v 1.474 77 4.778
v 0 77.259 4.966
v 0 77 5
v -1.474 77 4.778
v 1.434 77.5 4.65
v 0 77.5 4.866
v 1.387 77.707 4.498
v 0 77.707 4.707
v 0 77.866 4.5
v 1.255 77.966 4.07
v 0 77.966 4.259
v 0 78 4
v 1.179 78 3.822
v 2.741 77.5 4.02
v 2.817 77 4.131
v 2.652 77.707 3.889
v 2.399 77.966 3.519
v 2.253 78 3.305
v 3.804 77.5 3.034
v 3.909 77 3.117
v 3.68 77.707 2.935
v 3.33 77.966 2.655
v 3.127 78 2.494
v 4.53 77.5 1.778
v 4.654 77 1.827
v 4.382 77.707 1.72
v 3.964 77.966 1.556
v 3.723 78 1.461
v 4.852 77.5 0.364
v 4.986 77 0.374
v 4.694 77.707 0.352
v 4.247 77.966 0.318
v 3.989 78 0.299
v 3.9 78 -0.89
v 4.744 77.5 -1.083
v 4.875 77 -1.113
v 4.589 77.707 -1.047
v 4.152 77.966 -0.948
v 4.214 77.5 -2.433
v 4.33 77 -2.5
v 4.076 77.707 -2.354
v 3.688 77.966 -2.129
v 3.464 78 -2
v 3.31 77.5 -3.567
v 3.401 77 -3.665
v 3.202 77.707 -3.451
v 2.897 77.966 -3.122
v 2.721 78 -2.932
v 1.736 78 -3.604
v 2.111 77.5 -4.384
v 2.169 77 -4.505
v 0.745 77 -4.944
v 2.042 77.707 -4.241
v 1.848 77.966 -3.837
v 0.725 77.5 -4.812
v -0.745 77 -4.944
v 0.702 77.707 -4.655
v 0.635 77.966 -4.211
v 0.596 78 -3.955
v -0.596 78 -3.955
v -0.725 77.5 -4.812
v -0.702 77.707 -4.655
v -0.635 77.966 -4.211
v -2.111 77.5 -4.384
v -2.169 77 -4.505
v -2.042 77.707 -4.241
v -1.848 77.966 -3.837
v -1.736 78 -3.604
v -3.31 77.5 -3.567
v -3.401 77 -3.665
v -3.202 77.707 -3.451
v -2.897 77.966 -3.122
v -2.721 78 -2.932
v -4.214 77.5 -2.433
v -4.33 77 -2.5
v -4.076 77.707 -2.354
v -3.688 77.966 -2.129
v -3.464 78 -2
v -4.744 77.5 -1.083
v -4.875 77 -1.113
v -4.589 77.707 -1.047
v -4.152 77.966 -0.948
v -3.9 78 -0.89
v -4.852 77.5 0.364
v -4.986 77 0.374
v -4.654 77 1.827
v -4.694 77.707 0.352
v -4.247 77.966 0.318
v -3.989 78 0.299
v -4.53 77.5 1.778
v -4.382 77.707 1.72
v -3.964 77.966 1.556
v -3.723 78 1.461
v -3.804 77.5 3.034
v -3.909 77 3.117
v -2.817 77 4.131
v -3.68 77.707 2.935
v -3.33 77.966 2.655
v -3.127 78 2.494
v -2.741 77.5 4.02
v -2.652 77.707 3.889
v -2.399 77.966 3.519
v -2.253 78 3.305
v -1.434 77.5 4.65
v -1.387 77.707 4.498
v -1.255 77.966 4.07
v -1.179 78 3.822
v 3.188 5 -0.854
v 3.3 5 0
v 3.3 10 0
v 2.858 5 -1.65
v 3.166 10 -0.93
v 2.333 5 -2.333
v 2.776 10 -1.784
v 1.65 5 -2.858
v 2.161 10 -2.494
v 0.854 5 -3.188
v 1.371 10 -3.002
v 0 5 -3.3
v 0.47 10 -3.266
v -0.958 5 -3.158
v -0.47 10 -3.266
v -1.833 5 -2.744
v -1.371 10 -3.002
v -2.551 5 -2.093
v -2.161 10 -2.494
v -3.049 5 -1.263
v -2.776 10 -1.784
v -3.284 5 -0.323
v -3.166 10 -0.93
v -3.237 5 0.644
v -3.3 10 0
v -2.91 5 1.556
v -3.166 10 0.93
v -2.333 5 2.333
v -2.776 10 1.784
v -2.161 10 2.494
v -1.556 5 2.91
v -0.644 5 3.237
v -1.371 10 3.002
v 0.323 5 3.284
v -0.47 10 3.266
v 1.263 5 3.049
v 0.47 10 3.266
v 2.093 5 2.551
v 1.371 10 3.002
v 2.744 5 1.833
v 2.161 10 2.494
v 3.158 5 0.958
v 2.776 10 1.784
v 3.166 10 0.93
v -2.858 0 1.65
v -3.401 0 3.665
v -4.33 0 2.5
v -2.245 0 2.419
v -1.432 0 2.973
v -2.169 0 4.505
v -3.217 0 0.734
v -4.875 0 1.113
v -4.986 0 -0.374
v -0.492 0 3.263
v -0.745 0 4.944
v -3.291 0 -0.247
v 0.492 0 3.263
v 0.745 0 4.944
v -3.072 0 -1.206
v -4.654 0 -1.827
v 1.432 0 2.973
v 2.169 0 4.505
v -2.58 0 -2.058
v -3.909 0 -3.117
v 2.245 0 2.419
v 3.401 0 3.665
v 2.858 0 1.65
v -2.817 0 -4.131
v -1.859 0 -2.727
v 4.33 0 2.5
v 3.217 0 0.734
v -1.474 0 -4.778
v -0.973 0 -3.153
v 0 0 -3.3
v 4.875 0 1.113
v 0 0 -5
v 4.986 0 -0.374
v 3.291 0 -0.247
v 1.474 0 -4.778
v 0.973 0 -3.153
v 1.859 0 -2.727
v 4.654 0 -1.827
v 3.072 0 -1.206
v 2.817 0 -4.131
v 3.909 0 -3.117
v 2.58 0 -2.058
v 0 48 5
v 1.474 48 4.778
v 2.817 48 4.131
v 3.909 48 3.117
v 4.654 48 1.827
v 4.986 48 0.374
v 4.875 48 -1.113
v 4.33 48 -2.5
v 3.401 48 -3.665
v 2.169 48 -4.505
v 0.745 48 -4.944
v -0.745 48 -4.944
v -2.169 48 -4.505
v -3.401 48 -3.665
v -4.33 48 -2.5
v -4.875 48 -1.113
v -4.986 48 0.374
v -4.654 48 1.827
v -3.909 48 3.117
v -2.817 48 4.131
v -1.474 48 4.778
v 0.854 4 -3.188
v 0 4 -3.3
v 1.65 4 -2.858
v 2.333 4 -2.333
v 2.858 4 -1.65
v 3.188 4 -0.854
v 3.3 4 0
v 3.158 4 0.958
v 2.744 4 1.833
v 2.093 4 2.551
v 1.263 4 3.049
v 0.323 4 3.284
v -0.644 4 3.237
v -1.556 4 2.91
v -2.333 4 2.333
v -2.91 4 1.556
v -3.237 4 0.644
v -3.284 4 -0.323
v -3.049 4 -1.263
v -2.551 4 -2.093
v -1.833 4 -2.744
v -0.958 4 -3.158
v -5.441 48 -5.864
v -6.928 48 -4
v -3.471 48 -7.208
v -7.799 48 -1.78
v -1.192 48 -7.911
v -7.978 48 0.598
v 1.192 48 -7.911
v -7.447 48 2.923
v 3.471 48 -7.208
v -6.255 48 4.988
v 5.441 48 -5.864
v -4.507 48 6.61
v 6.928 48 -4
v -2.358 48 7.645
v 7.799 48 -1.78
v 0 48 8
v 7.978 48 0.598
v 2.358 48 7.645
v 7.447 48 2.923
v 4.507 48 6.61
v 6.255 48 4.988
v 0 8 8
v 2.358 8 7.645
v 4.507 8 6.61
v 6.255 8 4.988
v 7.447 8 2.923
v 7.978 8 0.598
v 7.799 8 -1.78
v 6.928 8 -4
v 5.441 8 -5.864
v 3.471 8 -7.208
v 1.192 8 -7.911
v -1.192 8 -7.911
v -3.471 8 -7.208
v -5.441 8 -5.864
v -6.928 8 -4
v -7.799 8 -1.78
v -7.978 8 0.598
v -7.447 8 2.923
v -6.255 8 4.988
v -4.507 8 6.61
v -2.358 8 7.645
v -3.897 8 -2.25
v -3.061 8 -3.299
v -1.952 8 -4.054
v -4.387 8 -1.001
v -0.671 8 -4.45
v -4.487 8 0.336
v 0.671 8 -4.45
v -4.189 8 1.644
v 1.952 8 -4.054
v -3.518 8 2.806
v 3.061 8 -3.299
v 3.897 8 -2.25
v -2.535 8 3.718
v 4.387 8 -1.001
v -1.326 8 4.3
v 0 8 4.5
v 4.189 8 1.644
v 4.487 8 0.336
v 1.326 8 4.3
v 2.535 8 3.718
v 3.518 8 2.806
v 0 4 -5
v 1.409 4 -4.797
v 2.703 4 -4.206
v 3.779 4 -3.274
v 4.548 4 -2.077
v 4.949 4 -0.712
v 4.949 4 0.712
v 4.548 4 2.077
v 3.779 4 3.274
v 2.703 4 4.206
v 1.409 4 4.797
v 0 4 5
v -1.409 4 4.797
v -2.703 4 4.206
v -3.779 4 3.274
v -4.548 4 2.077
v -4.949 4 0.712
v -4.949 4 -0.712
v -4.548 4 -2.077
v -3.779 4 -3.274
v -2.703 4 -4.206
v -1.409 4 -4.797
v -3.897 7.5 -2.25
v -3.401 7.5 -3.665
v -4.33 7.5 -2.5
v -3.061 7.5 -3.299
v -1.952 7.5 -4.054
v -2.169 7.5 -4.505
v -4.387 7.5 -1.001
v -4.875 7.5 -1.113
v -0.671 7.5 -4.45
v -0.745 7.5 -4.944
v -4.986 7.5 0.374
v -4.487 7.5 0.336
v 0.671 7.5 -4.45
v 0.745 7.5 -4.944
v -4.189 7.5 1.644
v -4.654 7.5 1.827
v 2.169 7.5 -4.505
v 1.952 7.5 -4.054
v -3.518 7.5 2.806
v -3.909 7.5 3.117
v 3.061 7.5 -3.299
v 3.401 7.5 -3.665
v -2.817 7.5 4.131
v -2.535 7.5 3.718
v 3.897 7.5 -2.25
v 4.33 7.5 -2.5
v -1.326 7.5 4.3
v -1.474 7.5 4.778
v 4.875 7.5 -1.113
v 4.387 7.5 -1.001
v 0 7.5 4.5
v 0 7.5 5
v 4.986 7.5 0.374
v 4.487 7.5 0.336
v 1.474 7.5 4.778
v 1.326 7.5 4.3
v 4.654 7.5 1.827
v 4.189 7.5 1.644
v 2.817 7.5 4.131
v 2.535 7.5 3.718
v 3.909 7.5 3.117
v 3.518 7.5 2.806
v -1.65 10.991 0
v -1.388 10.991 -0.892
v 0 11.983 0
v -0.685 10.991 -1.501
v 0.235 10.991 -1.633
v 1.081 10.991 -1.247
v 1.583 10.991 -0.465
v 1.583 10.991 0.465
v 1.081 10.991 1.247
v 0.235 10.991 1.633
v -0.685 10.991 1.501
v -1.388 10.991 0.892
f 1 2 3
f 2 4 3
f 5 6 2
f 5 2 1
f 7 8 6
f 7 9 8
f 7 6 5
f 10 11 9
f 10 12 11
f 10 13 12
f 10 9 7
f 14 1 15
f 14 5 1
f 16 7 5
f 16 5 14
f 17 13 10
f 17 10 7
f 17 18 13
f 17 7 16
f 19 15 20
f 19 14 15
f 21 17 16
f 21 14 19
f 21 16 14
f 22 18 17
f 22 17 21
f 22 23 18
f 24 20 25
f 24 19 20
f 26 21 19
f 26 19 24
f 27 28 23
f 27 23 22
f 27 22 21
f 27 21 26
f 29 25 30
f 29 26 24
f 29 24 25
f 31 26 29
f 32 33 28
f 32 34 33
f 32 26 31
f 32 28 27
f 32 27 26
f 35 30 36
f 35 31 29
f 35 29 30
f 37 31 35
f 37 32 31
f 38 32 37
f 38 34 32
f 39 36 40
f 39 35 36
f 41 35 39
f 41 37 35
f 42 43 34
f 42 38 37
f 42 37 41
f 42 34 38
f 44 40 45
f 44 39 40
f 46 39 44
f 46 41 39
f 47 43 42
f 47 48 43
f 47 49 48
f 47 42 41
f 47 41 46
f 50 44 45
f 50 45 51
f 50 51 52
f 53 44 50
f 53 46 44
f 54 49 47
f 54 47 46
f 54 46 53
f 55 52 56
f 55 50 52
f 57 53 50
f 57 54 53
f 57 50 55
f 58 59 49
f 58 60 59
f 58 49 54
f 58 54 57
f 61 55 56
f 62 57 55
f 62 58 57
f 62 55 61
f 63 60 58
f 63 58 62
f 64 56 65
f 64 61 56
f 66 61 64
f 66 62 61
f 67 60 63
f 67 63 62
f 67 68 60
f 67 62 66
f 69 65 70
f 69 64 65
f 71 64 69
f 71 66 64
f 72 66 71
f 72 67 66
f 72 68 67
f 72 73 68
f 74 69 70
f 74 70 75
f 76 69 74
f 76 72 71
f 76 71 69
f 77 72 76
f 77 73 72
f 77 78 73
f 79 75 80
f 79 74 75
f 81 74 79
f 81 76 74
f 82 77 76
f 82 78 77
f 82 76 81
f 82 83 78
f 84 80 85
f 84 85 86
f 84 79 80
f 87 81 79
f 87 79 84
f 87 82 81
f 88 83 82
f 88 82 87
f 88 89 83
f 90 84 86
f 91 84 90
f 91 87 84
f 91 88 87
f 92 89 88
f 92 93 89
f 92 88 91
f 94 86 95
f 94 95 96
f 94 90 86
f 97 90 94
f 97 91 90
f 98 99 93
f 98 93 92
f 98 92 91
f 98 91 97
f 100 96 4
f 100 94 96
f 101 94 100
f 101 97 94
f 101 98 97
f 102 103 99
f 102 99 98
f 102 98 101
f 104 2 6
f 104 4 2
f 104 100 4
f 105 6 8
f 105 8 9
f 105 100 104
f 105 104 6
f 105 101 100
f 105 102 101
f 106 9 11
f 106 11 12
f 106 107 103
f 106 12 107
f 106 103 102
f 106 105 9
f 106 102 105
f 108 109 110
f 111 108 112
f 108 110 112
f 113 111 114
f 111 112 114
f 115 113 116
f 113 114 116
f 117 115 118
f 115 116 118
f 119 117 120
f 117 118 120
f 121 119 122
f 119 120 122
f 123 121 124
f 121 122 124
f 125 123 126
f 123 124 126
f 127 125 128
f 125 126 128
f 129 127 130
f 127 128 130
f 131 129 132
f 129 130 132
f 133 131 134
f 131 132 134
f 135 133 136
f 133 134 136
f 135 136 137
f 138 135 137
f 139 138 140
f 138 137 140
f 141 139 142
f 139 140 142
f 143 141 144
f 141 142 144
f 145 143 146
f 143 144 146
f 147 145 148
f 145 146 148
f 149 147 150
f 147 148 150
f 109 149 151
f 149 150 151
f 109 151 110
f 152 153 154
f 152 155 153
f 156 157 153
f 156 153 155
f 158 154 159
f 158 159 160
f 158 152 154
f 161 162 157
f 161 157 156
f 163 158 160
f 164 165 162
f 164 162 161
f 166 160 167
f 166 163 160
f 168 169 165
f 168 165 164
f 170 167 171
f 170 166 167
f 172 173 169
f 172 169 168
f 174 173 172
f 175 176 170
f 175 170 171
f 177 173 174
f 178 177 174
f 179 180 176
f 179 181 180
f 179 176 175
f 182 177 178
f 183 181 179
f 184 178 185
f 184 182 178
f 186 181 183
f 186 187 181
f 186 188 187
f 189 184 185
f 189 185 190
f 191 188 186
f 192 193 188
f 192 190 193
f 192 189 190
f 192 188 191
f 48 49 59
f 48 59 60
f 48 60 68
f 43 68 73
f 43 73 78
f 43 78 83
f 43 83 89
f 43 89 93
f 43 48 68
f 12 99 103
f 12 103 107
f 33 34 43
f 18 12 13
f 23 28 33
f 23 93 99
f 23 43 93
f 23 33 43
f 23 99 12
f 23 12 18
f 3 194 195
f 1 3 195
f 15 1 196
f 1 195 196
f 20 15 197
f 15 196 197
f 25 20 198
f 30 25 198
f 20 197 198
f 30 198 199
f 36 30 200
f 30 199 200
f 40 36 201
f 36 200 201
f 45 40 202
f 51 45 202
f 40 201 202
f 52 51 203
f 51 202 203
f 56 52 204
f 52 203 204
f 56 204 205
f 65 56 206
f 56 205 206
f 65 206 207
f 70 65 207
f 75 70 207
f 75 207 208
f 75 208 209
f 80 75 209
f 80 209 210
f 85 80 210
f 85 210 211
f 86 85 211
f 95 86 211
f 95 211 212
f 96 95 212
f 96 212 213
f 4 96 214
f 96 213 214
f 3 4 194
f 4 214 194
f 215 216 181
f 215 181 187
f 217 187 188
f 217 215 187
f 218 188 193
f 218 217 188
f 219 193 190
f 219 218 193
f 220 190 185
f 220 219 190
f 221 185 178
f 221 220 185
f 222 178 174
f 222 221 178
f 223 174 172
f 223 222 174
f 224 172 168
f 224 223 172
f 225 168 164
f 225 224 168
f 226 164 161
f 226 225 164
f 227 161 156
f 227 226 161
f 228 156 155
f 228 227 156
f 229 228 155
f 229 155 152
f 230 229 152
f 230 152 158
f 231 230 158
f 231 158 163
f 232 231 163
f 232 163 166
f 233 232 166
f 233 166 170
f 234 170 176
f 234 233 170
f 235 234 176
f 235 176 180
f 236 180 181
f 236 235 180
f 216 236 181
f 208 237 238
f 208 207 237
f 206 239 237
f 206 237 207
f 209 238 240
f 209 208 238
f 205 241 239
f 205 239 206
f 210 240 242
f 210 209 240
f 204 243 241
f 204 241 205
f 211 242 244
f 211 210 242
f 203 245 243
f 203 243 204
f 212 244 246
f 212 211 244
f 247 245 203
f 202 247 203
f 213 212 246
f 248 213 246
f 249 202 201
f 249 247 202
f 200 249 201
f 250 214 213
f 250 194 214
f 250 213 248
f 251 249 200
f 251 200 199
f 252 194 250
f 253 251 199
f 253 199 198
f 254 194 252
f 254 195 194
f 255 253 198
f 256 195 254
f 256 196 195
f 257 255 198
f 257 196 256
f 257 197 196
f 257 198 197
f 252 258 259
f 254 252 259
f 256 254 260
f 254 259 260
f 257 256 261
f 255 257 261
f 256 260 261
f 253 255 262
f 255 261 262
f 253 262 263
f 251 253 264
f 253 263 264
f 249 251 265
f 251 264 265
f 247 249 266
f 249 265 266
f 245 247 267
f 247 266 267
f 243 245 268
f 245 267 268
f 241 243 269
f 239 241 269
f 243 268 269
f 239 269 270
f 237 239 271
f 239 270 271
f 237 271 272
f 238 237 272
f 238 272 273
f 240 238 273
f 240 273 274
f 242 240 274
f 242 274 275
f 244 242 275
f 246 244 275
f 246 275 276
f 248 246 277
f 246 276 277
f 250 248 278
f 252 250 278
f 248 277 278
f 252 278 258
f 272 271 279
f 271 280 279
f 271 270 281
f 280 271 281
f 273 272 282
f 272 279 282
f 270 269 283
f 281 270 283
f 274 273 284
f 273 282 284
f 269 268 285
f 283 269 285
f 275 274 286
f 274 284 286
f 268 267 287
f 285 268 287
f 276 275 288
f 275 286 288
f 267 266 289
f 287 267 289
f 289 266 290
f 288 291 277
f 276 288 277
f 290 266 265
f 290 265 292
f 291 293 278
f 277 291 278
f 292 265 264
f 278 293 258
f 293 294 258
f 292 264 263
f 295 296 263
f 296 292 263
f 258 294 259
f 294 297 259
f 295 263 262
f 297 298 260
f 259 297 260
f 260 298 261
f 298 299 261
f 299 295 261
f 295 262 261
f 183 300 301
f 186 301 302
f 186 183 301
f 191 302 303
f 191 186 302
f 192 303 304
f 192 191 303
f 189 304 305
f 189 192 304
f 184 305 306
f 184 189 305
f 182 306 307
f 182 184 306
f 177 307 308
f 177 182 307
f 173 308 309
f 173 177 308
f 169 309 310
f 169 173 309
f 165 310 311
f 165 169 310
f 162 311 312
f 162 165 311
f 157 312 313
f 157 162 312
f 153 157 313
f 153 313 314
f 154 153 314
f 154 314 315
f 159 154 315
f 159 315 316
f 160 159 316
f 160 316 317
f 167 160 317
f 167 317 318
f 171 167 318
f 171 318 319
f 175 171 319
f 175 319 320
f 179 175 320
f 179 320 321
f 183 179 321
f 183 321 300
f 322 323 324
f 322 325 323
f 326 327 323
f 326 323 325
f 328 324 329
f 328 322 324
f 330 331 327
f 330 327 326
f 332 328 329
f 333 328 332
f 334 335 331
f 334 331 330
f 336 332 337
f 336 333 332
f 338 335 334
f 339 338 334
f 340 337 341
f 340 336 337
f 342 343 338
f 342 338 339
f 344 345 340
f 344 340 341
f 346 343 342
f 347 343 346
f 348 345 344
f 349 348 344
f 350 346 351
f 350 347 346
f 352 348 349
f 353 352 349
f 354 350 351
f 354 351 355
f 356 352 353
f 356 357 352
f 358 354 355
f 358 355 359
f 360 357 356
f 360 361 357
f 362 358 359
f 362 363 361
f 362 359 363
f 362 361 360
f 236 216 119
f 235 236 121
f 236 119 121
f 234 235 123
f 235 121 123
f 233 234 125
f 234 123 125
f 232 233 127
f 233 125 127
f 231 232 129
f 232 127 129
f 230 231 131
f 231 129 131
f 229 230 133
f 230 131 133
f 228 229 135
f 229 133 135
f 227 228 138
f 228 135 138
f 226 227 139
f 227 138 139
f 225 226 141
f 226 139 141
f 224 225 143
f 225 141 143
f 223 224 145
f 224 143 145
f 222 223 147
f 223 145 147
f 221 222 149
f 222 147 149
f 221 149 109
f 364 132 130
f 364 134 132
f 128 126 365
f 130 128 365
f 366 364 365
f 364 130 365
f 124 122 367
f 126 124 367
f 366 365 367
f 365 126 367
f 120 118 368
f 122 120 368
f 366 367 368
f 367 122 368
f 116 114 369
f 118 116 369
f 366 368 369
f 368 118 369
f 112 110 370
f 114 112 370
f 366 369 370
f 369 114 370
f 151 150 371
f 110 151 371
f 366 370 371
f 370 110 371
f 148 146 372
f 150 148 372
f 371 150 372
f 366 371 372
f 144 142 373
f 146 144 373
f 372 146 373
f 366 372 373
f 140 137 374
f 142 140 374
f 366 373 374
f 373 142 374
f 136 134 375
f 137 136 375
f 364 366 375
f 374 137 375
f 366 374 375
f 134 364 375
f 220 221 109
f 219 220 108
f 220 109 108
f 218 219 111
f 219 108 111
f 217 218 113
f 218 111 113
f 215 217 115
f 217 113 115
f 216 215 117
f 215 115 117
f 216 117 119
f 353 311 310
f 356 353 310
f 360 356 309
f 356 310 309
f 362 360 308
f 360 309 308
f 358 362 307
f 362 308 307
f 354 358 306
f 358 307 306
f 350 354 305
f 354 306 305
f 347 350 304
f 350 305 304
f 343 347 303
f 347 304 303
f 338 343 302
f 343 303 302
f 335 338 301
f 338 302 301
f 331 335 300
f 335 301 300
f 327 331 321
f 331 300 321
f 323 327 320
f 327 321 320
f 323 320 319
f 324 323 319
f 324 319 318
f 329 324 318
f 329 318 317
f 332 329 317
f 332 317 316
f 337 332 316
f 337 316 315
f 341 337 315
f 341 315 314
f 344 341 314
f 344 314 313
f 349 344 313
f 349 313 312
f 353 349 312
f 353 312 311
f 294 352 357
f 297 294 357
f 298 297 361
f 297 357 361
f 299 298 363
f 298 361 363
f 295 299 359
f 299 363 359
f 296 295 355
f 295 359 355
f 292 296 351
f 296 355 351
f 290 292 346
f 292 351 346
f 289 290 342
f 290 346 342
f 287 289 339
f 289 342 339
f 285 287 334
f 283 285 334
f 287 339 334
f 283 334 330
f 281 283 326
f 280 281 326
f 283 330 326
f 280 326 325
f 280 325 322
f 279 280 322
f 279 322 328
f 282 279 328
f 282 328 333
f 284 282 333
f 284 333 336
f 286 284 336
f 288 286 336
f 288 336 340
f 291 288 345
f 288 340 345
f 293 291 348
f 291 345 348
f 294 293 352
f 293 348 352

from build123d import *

# Parameters (mm, degrees)
SKETCH9_R                               = 5
BOSS_EXTRUDE7_DEPTH                     = 7.5
SKETCH10_R                              = 4.5
BOSS_EXTRUDE8_DEPTH                     = 0.5
SKETCH11_R                              = 8
BOSS_EXTRUDE9_DEPTH                     = 40
SKETCH12_R                              = 5
BOSS_EXTRUDE10_DEPTH                    = 30
FILLET7_R                               = 1
CBORE_FOR_M6_HEX_HEAD_BOLT2_D           = 6.6
CBORE_FOR_M6_HEX_HEAD_BOLT2_DEPTH       = 10
CBORE_FOR_M6_HEX_HEAD_BOLT2_CBORE_D     = 14.547
CBORE_FOR_M6_HEX_HEAD_BOLT2_CBORE_DEPTH = 4
CBORE_FOR_M6_HEX_HEAD_BOLT2_TIP         = 1.982840043
BOSS_EXTRUDE11_START                    = 4
SKETCH27_R                              = 5
BOSS_EXTRUDE11_DEPTH                    = 4
CUT_EXTRUDE1_START                      = -5
SKETCH28_R                              = 3.3
CUT_EXTRUDE1_DEPTH                      = 5


with BuildPart() as part:
    # Sketch9 → Boss-Extrude7 (new body)
    with BuildSketch(Plane(origin=(0, 0, 0), x_dir=(1, 0, 0), z_dir=(0, 1, 0))):
        with Locations(Location((0, 0, 0), (0, 0, 270))):
            Circle(SKETCH9_R)
    extrude(amount=BOSS_EXTRUDE7_DEPTH)

    # Sketch10 → Boss-Extrude8 (add)
    with BuildSketch(Plane(origin=(0, 7.5, 0), x_dir=(1, 0, 0), z_dir=(0, 1, 0))):
        with Locations(Location((0, 0, 0), (0, 0, 270))):
            Circle(SKETCH10_R)
    extrude(amount=BOSS_EXTRUDE8_DEPTH)

    # Sketch11 → Boss-Extrude9 (add)
    with BuildSketch(Plane(origin=(0, 8, 0), x_dir=(1, 0, 0), z_dir=(0, 1, 0))):
        with Locations(Location((0, 0, 0), (0, 0, 270))):
            Circle(SKETCH11_R)
    extrude(amount=BOSS_EXTRUDE9_DEPTH)

    # Sketch12 → Boss-Extrude10 (add)
    with BuildSketch(Plane(origin=(0, 48, 0), x_dir=(1, 0, 0), z_dir=(0, 1, 0))):
        with Locations(Location((0, 0, 0), (0, 0, 270))):
            Circle(SKETCH12_R)
    extrude(amount=BOSS_EXTRUDE10_DEPTH)

    # Fillet7
    fillet7_edges = [part.edges().sort_by_distance(p)[0] for p in [
        (0, 78, -5),
    ]]
    fillet(fillet7_edges, radius=FILLET7_R)

    # CBORE for M6 Hex Head Bolt2
    with Locations(Plane(origin=(0, 0, 0), x_dir=(-1, 0, 0), z_dir=(0, -1, 0))):
        with Locations((0, 0)):
            CounterBoreHole(CBORE_FOR_M6_HEX_HEAD_BOLT2_D / 2, CBORE_FOR_M6_HEX_HEAD_BOLT2_CBORE_D / 2, CBORE_FOR_M6_HEX_HEAD_BOLT2_CBORE_DEPTH, depth=CBORE_FOR_M6_HEX_HEAD_BOLT2_DEPTH)
            with Locations((0, 0, -(CBORE_FOR_M6_HEX_HEAD_BOLT2_DEPTH + CBORE_FOR_M6_HEX_HEAD_BOLT2_TIP / 2))):  # 118° drill point
                Cone(0, CBORE_FOR_M6_HEX_HEAD_BOLT2_D / 2, CBORE_FOR_M6_HEX_HEAD_BOLT2_TIP, mode=Mode.SUBTRACT)

    # Sketch27 → Boss-Extrude11 (add)
    with BuildSketch(Plane.XZ.offset(-4).offset(BOSS_EXTRUDE11_START)):
        with Locations(Location((0, 0, 0), (0, 0, 270))):
            Circle(SKETCH27_R)
    extrude(amount=-BOSS_EXTRUDE11_DEPTH)

    # Sketch28 → Cut-Extrude1 (cut)
    with BuildSketch(Plane.XZ.offset(CUT_EXTRUDE1_START)):
        with Locations(Location((0, 0, 0), (0, 0, 270))):
            Circle(SKETCH28_R)
    extrude(amount=CUT_EXTRUDE1_DEPTH, mode=Mode.SUBTRACT)


solid = part.part
